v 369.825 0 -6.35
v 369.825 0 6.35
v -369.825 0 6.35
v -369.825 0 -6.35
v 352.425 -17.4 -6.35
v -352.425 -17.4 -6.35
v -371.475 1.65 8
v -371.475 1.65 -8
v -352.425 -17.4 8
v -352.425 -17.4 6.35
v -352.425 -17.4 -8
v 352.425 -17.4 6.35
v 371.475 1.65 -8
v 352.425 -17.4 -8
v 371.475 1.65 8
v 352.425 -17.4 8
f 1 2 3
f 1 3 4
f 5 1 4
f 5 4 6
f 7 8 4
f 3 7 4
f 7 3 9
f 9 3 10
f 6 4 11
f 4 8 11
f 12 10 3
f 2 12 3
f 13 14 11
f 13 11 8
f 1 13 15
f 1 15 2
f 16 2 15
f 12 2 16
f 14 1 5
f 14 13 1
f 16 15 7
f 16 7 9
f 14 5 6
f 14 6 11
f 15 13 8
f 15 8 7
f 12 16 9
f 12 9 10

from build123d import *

# Parameters (mm, degrees)
BOSS_EXTRUDE1_DEPTH           = 371.475
CUT_RIGHT_SIDE_TOP_DEPTH      = 1
CUT_RIGHT_SIDE_TOP_DEPTH_BACK = 17
CUT_LEFT_SIDE_TOP_DEPTH       = 1
CUT_LEFT_SIDE_TOP_DEPTH_BACK  = 17


with BuildPart() as part:
    # Sketch1 → Boss-Extrude1 (new body, symmetric)
    with BuildSketch(Plane(origin=(0, 0, 0), x_dir=(0, 0, -1), z_dir=(1, 0, 0))):
        Polygon((-6.35, 0), (6.35, 0), (6.35, -17.4), (8, -17.4), (8, 1.65), (-8, 1.65), (-8, -17.4), (-6.35, -17.4), align=None)
    extrude(amount=BOSS_EXTRUDE1_DEPTH, both=True)

    # Sketch7 → Cut-Right-Side-Top (cut, two sides)
    with BuildSketch(Plane(origin=(0, 0, -8), x_dir=(-1, 0, 0), z_dir=(0, 0, -1))) as cut_right_side_top_sk:
        Polygon((-371.475, 1.65), (-352.425, -17.4), (-371.475, -17.4), align=None)
    extrude(amount=CUT_RIGHT_SIDE_TOP_DEPTH, mode=Mode.SUBTRACT)
    extrude(cut_right_side_top_sk.sketch, amount=-CUT_RIGHT_SIDE_TOP_DEPTH_BACK, mode=Mode.SUBTRACT)

    # Sketch5 → Cut-Left-Side-Top (cut, two sides)
    with BuildSketch(Plane(origin=(0, 0, -8), x_dir=(-1, 0, 0), z_dir=(0, 0, -1))) as cut_left_side_top_sk:
        Polygon((371.475, 1.65), (352.425, -17.4), (371.475, -17.4), align=None)
    extrude(amount=CUT_LEFT_SIDE_TOP_DEPTH, mode=Mode.SUBTRACT)
    extrude(cut_left_side_top_sk.sketch, amount=-CUT_LEFT_SIDE_TOP_DEPTH_BACK, mode=Mode.SUBTRACT)


solid = part.part
